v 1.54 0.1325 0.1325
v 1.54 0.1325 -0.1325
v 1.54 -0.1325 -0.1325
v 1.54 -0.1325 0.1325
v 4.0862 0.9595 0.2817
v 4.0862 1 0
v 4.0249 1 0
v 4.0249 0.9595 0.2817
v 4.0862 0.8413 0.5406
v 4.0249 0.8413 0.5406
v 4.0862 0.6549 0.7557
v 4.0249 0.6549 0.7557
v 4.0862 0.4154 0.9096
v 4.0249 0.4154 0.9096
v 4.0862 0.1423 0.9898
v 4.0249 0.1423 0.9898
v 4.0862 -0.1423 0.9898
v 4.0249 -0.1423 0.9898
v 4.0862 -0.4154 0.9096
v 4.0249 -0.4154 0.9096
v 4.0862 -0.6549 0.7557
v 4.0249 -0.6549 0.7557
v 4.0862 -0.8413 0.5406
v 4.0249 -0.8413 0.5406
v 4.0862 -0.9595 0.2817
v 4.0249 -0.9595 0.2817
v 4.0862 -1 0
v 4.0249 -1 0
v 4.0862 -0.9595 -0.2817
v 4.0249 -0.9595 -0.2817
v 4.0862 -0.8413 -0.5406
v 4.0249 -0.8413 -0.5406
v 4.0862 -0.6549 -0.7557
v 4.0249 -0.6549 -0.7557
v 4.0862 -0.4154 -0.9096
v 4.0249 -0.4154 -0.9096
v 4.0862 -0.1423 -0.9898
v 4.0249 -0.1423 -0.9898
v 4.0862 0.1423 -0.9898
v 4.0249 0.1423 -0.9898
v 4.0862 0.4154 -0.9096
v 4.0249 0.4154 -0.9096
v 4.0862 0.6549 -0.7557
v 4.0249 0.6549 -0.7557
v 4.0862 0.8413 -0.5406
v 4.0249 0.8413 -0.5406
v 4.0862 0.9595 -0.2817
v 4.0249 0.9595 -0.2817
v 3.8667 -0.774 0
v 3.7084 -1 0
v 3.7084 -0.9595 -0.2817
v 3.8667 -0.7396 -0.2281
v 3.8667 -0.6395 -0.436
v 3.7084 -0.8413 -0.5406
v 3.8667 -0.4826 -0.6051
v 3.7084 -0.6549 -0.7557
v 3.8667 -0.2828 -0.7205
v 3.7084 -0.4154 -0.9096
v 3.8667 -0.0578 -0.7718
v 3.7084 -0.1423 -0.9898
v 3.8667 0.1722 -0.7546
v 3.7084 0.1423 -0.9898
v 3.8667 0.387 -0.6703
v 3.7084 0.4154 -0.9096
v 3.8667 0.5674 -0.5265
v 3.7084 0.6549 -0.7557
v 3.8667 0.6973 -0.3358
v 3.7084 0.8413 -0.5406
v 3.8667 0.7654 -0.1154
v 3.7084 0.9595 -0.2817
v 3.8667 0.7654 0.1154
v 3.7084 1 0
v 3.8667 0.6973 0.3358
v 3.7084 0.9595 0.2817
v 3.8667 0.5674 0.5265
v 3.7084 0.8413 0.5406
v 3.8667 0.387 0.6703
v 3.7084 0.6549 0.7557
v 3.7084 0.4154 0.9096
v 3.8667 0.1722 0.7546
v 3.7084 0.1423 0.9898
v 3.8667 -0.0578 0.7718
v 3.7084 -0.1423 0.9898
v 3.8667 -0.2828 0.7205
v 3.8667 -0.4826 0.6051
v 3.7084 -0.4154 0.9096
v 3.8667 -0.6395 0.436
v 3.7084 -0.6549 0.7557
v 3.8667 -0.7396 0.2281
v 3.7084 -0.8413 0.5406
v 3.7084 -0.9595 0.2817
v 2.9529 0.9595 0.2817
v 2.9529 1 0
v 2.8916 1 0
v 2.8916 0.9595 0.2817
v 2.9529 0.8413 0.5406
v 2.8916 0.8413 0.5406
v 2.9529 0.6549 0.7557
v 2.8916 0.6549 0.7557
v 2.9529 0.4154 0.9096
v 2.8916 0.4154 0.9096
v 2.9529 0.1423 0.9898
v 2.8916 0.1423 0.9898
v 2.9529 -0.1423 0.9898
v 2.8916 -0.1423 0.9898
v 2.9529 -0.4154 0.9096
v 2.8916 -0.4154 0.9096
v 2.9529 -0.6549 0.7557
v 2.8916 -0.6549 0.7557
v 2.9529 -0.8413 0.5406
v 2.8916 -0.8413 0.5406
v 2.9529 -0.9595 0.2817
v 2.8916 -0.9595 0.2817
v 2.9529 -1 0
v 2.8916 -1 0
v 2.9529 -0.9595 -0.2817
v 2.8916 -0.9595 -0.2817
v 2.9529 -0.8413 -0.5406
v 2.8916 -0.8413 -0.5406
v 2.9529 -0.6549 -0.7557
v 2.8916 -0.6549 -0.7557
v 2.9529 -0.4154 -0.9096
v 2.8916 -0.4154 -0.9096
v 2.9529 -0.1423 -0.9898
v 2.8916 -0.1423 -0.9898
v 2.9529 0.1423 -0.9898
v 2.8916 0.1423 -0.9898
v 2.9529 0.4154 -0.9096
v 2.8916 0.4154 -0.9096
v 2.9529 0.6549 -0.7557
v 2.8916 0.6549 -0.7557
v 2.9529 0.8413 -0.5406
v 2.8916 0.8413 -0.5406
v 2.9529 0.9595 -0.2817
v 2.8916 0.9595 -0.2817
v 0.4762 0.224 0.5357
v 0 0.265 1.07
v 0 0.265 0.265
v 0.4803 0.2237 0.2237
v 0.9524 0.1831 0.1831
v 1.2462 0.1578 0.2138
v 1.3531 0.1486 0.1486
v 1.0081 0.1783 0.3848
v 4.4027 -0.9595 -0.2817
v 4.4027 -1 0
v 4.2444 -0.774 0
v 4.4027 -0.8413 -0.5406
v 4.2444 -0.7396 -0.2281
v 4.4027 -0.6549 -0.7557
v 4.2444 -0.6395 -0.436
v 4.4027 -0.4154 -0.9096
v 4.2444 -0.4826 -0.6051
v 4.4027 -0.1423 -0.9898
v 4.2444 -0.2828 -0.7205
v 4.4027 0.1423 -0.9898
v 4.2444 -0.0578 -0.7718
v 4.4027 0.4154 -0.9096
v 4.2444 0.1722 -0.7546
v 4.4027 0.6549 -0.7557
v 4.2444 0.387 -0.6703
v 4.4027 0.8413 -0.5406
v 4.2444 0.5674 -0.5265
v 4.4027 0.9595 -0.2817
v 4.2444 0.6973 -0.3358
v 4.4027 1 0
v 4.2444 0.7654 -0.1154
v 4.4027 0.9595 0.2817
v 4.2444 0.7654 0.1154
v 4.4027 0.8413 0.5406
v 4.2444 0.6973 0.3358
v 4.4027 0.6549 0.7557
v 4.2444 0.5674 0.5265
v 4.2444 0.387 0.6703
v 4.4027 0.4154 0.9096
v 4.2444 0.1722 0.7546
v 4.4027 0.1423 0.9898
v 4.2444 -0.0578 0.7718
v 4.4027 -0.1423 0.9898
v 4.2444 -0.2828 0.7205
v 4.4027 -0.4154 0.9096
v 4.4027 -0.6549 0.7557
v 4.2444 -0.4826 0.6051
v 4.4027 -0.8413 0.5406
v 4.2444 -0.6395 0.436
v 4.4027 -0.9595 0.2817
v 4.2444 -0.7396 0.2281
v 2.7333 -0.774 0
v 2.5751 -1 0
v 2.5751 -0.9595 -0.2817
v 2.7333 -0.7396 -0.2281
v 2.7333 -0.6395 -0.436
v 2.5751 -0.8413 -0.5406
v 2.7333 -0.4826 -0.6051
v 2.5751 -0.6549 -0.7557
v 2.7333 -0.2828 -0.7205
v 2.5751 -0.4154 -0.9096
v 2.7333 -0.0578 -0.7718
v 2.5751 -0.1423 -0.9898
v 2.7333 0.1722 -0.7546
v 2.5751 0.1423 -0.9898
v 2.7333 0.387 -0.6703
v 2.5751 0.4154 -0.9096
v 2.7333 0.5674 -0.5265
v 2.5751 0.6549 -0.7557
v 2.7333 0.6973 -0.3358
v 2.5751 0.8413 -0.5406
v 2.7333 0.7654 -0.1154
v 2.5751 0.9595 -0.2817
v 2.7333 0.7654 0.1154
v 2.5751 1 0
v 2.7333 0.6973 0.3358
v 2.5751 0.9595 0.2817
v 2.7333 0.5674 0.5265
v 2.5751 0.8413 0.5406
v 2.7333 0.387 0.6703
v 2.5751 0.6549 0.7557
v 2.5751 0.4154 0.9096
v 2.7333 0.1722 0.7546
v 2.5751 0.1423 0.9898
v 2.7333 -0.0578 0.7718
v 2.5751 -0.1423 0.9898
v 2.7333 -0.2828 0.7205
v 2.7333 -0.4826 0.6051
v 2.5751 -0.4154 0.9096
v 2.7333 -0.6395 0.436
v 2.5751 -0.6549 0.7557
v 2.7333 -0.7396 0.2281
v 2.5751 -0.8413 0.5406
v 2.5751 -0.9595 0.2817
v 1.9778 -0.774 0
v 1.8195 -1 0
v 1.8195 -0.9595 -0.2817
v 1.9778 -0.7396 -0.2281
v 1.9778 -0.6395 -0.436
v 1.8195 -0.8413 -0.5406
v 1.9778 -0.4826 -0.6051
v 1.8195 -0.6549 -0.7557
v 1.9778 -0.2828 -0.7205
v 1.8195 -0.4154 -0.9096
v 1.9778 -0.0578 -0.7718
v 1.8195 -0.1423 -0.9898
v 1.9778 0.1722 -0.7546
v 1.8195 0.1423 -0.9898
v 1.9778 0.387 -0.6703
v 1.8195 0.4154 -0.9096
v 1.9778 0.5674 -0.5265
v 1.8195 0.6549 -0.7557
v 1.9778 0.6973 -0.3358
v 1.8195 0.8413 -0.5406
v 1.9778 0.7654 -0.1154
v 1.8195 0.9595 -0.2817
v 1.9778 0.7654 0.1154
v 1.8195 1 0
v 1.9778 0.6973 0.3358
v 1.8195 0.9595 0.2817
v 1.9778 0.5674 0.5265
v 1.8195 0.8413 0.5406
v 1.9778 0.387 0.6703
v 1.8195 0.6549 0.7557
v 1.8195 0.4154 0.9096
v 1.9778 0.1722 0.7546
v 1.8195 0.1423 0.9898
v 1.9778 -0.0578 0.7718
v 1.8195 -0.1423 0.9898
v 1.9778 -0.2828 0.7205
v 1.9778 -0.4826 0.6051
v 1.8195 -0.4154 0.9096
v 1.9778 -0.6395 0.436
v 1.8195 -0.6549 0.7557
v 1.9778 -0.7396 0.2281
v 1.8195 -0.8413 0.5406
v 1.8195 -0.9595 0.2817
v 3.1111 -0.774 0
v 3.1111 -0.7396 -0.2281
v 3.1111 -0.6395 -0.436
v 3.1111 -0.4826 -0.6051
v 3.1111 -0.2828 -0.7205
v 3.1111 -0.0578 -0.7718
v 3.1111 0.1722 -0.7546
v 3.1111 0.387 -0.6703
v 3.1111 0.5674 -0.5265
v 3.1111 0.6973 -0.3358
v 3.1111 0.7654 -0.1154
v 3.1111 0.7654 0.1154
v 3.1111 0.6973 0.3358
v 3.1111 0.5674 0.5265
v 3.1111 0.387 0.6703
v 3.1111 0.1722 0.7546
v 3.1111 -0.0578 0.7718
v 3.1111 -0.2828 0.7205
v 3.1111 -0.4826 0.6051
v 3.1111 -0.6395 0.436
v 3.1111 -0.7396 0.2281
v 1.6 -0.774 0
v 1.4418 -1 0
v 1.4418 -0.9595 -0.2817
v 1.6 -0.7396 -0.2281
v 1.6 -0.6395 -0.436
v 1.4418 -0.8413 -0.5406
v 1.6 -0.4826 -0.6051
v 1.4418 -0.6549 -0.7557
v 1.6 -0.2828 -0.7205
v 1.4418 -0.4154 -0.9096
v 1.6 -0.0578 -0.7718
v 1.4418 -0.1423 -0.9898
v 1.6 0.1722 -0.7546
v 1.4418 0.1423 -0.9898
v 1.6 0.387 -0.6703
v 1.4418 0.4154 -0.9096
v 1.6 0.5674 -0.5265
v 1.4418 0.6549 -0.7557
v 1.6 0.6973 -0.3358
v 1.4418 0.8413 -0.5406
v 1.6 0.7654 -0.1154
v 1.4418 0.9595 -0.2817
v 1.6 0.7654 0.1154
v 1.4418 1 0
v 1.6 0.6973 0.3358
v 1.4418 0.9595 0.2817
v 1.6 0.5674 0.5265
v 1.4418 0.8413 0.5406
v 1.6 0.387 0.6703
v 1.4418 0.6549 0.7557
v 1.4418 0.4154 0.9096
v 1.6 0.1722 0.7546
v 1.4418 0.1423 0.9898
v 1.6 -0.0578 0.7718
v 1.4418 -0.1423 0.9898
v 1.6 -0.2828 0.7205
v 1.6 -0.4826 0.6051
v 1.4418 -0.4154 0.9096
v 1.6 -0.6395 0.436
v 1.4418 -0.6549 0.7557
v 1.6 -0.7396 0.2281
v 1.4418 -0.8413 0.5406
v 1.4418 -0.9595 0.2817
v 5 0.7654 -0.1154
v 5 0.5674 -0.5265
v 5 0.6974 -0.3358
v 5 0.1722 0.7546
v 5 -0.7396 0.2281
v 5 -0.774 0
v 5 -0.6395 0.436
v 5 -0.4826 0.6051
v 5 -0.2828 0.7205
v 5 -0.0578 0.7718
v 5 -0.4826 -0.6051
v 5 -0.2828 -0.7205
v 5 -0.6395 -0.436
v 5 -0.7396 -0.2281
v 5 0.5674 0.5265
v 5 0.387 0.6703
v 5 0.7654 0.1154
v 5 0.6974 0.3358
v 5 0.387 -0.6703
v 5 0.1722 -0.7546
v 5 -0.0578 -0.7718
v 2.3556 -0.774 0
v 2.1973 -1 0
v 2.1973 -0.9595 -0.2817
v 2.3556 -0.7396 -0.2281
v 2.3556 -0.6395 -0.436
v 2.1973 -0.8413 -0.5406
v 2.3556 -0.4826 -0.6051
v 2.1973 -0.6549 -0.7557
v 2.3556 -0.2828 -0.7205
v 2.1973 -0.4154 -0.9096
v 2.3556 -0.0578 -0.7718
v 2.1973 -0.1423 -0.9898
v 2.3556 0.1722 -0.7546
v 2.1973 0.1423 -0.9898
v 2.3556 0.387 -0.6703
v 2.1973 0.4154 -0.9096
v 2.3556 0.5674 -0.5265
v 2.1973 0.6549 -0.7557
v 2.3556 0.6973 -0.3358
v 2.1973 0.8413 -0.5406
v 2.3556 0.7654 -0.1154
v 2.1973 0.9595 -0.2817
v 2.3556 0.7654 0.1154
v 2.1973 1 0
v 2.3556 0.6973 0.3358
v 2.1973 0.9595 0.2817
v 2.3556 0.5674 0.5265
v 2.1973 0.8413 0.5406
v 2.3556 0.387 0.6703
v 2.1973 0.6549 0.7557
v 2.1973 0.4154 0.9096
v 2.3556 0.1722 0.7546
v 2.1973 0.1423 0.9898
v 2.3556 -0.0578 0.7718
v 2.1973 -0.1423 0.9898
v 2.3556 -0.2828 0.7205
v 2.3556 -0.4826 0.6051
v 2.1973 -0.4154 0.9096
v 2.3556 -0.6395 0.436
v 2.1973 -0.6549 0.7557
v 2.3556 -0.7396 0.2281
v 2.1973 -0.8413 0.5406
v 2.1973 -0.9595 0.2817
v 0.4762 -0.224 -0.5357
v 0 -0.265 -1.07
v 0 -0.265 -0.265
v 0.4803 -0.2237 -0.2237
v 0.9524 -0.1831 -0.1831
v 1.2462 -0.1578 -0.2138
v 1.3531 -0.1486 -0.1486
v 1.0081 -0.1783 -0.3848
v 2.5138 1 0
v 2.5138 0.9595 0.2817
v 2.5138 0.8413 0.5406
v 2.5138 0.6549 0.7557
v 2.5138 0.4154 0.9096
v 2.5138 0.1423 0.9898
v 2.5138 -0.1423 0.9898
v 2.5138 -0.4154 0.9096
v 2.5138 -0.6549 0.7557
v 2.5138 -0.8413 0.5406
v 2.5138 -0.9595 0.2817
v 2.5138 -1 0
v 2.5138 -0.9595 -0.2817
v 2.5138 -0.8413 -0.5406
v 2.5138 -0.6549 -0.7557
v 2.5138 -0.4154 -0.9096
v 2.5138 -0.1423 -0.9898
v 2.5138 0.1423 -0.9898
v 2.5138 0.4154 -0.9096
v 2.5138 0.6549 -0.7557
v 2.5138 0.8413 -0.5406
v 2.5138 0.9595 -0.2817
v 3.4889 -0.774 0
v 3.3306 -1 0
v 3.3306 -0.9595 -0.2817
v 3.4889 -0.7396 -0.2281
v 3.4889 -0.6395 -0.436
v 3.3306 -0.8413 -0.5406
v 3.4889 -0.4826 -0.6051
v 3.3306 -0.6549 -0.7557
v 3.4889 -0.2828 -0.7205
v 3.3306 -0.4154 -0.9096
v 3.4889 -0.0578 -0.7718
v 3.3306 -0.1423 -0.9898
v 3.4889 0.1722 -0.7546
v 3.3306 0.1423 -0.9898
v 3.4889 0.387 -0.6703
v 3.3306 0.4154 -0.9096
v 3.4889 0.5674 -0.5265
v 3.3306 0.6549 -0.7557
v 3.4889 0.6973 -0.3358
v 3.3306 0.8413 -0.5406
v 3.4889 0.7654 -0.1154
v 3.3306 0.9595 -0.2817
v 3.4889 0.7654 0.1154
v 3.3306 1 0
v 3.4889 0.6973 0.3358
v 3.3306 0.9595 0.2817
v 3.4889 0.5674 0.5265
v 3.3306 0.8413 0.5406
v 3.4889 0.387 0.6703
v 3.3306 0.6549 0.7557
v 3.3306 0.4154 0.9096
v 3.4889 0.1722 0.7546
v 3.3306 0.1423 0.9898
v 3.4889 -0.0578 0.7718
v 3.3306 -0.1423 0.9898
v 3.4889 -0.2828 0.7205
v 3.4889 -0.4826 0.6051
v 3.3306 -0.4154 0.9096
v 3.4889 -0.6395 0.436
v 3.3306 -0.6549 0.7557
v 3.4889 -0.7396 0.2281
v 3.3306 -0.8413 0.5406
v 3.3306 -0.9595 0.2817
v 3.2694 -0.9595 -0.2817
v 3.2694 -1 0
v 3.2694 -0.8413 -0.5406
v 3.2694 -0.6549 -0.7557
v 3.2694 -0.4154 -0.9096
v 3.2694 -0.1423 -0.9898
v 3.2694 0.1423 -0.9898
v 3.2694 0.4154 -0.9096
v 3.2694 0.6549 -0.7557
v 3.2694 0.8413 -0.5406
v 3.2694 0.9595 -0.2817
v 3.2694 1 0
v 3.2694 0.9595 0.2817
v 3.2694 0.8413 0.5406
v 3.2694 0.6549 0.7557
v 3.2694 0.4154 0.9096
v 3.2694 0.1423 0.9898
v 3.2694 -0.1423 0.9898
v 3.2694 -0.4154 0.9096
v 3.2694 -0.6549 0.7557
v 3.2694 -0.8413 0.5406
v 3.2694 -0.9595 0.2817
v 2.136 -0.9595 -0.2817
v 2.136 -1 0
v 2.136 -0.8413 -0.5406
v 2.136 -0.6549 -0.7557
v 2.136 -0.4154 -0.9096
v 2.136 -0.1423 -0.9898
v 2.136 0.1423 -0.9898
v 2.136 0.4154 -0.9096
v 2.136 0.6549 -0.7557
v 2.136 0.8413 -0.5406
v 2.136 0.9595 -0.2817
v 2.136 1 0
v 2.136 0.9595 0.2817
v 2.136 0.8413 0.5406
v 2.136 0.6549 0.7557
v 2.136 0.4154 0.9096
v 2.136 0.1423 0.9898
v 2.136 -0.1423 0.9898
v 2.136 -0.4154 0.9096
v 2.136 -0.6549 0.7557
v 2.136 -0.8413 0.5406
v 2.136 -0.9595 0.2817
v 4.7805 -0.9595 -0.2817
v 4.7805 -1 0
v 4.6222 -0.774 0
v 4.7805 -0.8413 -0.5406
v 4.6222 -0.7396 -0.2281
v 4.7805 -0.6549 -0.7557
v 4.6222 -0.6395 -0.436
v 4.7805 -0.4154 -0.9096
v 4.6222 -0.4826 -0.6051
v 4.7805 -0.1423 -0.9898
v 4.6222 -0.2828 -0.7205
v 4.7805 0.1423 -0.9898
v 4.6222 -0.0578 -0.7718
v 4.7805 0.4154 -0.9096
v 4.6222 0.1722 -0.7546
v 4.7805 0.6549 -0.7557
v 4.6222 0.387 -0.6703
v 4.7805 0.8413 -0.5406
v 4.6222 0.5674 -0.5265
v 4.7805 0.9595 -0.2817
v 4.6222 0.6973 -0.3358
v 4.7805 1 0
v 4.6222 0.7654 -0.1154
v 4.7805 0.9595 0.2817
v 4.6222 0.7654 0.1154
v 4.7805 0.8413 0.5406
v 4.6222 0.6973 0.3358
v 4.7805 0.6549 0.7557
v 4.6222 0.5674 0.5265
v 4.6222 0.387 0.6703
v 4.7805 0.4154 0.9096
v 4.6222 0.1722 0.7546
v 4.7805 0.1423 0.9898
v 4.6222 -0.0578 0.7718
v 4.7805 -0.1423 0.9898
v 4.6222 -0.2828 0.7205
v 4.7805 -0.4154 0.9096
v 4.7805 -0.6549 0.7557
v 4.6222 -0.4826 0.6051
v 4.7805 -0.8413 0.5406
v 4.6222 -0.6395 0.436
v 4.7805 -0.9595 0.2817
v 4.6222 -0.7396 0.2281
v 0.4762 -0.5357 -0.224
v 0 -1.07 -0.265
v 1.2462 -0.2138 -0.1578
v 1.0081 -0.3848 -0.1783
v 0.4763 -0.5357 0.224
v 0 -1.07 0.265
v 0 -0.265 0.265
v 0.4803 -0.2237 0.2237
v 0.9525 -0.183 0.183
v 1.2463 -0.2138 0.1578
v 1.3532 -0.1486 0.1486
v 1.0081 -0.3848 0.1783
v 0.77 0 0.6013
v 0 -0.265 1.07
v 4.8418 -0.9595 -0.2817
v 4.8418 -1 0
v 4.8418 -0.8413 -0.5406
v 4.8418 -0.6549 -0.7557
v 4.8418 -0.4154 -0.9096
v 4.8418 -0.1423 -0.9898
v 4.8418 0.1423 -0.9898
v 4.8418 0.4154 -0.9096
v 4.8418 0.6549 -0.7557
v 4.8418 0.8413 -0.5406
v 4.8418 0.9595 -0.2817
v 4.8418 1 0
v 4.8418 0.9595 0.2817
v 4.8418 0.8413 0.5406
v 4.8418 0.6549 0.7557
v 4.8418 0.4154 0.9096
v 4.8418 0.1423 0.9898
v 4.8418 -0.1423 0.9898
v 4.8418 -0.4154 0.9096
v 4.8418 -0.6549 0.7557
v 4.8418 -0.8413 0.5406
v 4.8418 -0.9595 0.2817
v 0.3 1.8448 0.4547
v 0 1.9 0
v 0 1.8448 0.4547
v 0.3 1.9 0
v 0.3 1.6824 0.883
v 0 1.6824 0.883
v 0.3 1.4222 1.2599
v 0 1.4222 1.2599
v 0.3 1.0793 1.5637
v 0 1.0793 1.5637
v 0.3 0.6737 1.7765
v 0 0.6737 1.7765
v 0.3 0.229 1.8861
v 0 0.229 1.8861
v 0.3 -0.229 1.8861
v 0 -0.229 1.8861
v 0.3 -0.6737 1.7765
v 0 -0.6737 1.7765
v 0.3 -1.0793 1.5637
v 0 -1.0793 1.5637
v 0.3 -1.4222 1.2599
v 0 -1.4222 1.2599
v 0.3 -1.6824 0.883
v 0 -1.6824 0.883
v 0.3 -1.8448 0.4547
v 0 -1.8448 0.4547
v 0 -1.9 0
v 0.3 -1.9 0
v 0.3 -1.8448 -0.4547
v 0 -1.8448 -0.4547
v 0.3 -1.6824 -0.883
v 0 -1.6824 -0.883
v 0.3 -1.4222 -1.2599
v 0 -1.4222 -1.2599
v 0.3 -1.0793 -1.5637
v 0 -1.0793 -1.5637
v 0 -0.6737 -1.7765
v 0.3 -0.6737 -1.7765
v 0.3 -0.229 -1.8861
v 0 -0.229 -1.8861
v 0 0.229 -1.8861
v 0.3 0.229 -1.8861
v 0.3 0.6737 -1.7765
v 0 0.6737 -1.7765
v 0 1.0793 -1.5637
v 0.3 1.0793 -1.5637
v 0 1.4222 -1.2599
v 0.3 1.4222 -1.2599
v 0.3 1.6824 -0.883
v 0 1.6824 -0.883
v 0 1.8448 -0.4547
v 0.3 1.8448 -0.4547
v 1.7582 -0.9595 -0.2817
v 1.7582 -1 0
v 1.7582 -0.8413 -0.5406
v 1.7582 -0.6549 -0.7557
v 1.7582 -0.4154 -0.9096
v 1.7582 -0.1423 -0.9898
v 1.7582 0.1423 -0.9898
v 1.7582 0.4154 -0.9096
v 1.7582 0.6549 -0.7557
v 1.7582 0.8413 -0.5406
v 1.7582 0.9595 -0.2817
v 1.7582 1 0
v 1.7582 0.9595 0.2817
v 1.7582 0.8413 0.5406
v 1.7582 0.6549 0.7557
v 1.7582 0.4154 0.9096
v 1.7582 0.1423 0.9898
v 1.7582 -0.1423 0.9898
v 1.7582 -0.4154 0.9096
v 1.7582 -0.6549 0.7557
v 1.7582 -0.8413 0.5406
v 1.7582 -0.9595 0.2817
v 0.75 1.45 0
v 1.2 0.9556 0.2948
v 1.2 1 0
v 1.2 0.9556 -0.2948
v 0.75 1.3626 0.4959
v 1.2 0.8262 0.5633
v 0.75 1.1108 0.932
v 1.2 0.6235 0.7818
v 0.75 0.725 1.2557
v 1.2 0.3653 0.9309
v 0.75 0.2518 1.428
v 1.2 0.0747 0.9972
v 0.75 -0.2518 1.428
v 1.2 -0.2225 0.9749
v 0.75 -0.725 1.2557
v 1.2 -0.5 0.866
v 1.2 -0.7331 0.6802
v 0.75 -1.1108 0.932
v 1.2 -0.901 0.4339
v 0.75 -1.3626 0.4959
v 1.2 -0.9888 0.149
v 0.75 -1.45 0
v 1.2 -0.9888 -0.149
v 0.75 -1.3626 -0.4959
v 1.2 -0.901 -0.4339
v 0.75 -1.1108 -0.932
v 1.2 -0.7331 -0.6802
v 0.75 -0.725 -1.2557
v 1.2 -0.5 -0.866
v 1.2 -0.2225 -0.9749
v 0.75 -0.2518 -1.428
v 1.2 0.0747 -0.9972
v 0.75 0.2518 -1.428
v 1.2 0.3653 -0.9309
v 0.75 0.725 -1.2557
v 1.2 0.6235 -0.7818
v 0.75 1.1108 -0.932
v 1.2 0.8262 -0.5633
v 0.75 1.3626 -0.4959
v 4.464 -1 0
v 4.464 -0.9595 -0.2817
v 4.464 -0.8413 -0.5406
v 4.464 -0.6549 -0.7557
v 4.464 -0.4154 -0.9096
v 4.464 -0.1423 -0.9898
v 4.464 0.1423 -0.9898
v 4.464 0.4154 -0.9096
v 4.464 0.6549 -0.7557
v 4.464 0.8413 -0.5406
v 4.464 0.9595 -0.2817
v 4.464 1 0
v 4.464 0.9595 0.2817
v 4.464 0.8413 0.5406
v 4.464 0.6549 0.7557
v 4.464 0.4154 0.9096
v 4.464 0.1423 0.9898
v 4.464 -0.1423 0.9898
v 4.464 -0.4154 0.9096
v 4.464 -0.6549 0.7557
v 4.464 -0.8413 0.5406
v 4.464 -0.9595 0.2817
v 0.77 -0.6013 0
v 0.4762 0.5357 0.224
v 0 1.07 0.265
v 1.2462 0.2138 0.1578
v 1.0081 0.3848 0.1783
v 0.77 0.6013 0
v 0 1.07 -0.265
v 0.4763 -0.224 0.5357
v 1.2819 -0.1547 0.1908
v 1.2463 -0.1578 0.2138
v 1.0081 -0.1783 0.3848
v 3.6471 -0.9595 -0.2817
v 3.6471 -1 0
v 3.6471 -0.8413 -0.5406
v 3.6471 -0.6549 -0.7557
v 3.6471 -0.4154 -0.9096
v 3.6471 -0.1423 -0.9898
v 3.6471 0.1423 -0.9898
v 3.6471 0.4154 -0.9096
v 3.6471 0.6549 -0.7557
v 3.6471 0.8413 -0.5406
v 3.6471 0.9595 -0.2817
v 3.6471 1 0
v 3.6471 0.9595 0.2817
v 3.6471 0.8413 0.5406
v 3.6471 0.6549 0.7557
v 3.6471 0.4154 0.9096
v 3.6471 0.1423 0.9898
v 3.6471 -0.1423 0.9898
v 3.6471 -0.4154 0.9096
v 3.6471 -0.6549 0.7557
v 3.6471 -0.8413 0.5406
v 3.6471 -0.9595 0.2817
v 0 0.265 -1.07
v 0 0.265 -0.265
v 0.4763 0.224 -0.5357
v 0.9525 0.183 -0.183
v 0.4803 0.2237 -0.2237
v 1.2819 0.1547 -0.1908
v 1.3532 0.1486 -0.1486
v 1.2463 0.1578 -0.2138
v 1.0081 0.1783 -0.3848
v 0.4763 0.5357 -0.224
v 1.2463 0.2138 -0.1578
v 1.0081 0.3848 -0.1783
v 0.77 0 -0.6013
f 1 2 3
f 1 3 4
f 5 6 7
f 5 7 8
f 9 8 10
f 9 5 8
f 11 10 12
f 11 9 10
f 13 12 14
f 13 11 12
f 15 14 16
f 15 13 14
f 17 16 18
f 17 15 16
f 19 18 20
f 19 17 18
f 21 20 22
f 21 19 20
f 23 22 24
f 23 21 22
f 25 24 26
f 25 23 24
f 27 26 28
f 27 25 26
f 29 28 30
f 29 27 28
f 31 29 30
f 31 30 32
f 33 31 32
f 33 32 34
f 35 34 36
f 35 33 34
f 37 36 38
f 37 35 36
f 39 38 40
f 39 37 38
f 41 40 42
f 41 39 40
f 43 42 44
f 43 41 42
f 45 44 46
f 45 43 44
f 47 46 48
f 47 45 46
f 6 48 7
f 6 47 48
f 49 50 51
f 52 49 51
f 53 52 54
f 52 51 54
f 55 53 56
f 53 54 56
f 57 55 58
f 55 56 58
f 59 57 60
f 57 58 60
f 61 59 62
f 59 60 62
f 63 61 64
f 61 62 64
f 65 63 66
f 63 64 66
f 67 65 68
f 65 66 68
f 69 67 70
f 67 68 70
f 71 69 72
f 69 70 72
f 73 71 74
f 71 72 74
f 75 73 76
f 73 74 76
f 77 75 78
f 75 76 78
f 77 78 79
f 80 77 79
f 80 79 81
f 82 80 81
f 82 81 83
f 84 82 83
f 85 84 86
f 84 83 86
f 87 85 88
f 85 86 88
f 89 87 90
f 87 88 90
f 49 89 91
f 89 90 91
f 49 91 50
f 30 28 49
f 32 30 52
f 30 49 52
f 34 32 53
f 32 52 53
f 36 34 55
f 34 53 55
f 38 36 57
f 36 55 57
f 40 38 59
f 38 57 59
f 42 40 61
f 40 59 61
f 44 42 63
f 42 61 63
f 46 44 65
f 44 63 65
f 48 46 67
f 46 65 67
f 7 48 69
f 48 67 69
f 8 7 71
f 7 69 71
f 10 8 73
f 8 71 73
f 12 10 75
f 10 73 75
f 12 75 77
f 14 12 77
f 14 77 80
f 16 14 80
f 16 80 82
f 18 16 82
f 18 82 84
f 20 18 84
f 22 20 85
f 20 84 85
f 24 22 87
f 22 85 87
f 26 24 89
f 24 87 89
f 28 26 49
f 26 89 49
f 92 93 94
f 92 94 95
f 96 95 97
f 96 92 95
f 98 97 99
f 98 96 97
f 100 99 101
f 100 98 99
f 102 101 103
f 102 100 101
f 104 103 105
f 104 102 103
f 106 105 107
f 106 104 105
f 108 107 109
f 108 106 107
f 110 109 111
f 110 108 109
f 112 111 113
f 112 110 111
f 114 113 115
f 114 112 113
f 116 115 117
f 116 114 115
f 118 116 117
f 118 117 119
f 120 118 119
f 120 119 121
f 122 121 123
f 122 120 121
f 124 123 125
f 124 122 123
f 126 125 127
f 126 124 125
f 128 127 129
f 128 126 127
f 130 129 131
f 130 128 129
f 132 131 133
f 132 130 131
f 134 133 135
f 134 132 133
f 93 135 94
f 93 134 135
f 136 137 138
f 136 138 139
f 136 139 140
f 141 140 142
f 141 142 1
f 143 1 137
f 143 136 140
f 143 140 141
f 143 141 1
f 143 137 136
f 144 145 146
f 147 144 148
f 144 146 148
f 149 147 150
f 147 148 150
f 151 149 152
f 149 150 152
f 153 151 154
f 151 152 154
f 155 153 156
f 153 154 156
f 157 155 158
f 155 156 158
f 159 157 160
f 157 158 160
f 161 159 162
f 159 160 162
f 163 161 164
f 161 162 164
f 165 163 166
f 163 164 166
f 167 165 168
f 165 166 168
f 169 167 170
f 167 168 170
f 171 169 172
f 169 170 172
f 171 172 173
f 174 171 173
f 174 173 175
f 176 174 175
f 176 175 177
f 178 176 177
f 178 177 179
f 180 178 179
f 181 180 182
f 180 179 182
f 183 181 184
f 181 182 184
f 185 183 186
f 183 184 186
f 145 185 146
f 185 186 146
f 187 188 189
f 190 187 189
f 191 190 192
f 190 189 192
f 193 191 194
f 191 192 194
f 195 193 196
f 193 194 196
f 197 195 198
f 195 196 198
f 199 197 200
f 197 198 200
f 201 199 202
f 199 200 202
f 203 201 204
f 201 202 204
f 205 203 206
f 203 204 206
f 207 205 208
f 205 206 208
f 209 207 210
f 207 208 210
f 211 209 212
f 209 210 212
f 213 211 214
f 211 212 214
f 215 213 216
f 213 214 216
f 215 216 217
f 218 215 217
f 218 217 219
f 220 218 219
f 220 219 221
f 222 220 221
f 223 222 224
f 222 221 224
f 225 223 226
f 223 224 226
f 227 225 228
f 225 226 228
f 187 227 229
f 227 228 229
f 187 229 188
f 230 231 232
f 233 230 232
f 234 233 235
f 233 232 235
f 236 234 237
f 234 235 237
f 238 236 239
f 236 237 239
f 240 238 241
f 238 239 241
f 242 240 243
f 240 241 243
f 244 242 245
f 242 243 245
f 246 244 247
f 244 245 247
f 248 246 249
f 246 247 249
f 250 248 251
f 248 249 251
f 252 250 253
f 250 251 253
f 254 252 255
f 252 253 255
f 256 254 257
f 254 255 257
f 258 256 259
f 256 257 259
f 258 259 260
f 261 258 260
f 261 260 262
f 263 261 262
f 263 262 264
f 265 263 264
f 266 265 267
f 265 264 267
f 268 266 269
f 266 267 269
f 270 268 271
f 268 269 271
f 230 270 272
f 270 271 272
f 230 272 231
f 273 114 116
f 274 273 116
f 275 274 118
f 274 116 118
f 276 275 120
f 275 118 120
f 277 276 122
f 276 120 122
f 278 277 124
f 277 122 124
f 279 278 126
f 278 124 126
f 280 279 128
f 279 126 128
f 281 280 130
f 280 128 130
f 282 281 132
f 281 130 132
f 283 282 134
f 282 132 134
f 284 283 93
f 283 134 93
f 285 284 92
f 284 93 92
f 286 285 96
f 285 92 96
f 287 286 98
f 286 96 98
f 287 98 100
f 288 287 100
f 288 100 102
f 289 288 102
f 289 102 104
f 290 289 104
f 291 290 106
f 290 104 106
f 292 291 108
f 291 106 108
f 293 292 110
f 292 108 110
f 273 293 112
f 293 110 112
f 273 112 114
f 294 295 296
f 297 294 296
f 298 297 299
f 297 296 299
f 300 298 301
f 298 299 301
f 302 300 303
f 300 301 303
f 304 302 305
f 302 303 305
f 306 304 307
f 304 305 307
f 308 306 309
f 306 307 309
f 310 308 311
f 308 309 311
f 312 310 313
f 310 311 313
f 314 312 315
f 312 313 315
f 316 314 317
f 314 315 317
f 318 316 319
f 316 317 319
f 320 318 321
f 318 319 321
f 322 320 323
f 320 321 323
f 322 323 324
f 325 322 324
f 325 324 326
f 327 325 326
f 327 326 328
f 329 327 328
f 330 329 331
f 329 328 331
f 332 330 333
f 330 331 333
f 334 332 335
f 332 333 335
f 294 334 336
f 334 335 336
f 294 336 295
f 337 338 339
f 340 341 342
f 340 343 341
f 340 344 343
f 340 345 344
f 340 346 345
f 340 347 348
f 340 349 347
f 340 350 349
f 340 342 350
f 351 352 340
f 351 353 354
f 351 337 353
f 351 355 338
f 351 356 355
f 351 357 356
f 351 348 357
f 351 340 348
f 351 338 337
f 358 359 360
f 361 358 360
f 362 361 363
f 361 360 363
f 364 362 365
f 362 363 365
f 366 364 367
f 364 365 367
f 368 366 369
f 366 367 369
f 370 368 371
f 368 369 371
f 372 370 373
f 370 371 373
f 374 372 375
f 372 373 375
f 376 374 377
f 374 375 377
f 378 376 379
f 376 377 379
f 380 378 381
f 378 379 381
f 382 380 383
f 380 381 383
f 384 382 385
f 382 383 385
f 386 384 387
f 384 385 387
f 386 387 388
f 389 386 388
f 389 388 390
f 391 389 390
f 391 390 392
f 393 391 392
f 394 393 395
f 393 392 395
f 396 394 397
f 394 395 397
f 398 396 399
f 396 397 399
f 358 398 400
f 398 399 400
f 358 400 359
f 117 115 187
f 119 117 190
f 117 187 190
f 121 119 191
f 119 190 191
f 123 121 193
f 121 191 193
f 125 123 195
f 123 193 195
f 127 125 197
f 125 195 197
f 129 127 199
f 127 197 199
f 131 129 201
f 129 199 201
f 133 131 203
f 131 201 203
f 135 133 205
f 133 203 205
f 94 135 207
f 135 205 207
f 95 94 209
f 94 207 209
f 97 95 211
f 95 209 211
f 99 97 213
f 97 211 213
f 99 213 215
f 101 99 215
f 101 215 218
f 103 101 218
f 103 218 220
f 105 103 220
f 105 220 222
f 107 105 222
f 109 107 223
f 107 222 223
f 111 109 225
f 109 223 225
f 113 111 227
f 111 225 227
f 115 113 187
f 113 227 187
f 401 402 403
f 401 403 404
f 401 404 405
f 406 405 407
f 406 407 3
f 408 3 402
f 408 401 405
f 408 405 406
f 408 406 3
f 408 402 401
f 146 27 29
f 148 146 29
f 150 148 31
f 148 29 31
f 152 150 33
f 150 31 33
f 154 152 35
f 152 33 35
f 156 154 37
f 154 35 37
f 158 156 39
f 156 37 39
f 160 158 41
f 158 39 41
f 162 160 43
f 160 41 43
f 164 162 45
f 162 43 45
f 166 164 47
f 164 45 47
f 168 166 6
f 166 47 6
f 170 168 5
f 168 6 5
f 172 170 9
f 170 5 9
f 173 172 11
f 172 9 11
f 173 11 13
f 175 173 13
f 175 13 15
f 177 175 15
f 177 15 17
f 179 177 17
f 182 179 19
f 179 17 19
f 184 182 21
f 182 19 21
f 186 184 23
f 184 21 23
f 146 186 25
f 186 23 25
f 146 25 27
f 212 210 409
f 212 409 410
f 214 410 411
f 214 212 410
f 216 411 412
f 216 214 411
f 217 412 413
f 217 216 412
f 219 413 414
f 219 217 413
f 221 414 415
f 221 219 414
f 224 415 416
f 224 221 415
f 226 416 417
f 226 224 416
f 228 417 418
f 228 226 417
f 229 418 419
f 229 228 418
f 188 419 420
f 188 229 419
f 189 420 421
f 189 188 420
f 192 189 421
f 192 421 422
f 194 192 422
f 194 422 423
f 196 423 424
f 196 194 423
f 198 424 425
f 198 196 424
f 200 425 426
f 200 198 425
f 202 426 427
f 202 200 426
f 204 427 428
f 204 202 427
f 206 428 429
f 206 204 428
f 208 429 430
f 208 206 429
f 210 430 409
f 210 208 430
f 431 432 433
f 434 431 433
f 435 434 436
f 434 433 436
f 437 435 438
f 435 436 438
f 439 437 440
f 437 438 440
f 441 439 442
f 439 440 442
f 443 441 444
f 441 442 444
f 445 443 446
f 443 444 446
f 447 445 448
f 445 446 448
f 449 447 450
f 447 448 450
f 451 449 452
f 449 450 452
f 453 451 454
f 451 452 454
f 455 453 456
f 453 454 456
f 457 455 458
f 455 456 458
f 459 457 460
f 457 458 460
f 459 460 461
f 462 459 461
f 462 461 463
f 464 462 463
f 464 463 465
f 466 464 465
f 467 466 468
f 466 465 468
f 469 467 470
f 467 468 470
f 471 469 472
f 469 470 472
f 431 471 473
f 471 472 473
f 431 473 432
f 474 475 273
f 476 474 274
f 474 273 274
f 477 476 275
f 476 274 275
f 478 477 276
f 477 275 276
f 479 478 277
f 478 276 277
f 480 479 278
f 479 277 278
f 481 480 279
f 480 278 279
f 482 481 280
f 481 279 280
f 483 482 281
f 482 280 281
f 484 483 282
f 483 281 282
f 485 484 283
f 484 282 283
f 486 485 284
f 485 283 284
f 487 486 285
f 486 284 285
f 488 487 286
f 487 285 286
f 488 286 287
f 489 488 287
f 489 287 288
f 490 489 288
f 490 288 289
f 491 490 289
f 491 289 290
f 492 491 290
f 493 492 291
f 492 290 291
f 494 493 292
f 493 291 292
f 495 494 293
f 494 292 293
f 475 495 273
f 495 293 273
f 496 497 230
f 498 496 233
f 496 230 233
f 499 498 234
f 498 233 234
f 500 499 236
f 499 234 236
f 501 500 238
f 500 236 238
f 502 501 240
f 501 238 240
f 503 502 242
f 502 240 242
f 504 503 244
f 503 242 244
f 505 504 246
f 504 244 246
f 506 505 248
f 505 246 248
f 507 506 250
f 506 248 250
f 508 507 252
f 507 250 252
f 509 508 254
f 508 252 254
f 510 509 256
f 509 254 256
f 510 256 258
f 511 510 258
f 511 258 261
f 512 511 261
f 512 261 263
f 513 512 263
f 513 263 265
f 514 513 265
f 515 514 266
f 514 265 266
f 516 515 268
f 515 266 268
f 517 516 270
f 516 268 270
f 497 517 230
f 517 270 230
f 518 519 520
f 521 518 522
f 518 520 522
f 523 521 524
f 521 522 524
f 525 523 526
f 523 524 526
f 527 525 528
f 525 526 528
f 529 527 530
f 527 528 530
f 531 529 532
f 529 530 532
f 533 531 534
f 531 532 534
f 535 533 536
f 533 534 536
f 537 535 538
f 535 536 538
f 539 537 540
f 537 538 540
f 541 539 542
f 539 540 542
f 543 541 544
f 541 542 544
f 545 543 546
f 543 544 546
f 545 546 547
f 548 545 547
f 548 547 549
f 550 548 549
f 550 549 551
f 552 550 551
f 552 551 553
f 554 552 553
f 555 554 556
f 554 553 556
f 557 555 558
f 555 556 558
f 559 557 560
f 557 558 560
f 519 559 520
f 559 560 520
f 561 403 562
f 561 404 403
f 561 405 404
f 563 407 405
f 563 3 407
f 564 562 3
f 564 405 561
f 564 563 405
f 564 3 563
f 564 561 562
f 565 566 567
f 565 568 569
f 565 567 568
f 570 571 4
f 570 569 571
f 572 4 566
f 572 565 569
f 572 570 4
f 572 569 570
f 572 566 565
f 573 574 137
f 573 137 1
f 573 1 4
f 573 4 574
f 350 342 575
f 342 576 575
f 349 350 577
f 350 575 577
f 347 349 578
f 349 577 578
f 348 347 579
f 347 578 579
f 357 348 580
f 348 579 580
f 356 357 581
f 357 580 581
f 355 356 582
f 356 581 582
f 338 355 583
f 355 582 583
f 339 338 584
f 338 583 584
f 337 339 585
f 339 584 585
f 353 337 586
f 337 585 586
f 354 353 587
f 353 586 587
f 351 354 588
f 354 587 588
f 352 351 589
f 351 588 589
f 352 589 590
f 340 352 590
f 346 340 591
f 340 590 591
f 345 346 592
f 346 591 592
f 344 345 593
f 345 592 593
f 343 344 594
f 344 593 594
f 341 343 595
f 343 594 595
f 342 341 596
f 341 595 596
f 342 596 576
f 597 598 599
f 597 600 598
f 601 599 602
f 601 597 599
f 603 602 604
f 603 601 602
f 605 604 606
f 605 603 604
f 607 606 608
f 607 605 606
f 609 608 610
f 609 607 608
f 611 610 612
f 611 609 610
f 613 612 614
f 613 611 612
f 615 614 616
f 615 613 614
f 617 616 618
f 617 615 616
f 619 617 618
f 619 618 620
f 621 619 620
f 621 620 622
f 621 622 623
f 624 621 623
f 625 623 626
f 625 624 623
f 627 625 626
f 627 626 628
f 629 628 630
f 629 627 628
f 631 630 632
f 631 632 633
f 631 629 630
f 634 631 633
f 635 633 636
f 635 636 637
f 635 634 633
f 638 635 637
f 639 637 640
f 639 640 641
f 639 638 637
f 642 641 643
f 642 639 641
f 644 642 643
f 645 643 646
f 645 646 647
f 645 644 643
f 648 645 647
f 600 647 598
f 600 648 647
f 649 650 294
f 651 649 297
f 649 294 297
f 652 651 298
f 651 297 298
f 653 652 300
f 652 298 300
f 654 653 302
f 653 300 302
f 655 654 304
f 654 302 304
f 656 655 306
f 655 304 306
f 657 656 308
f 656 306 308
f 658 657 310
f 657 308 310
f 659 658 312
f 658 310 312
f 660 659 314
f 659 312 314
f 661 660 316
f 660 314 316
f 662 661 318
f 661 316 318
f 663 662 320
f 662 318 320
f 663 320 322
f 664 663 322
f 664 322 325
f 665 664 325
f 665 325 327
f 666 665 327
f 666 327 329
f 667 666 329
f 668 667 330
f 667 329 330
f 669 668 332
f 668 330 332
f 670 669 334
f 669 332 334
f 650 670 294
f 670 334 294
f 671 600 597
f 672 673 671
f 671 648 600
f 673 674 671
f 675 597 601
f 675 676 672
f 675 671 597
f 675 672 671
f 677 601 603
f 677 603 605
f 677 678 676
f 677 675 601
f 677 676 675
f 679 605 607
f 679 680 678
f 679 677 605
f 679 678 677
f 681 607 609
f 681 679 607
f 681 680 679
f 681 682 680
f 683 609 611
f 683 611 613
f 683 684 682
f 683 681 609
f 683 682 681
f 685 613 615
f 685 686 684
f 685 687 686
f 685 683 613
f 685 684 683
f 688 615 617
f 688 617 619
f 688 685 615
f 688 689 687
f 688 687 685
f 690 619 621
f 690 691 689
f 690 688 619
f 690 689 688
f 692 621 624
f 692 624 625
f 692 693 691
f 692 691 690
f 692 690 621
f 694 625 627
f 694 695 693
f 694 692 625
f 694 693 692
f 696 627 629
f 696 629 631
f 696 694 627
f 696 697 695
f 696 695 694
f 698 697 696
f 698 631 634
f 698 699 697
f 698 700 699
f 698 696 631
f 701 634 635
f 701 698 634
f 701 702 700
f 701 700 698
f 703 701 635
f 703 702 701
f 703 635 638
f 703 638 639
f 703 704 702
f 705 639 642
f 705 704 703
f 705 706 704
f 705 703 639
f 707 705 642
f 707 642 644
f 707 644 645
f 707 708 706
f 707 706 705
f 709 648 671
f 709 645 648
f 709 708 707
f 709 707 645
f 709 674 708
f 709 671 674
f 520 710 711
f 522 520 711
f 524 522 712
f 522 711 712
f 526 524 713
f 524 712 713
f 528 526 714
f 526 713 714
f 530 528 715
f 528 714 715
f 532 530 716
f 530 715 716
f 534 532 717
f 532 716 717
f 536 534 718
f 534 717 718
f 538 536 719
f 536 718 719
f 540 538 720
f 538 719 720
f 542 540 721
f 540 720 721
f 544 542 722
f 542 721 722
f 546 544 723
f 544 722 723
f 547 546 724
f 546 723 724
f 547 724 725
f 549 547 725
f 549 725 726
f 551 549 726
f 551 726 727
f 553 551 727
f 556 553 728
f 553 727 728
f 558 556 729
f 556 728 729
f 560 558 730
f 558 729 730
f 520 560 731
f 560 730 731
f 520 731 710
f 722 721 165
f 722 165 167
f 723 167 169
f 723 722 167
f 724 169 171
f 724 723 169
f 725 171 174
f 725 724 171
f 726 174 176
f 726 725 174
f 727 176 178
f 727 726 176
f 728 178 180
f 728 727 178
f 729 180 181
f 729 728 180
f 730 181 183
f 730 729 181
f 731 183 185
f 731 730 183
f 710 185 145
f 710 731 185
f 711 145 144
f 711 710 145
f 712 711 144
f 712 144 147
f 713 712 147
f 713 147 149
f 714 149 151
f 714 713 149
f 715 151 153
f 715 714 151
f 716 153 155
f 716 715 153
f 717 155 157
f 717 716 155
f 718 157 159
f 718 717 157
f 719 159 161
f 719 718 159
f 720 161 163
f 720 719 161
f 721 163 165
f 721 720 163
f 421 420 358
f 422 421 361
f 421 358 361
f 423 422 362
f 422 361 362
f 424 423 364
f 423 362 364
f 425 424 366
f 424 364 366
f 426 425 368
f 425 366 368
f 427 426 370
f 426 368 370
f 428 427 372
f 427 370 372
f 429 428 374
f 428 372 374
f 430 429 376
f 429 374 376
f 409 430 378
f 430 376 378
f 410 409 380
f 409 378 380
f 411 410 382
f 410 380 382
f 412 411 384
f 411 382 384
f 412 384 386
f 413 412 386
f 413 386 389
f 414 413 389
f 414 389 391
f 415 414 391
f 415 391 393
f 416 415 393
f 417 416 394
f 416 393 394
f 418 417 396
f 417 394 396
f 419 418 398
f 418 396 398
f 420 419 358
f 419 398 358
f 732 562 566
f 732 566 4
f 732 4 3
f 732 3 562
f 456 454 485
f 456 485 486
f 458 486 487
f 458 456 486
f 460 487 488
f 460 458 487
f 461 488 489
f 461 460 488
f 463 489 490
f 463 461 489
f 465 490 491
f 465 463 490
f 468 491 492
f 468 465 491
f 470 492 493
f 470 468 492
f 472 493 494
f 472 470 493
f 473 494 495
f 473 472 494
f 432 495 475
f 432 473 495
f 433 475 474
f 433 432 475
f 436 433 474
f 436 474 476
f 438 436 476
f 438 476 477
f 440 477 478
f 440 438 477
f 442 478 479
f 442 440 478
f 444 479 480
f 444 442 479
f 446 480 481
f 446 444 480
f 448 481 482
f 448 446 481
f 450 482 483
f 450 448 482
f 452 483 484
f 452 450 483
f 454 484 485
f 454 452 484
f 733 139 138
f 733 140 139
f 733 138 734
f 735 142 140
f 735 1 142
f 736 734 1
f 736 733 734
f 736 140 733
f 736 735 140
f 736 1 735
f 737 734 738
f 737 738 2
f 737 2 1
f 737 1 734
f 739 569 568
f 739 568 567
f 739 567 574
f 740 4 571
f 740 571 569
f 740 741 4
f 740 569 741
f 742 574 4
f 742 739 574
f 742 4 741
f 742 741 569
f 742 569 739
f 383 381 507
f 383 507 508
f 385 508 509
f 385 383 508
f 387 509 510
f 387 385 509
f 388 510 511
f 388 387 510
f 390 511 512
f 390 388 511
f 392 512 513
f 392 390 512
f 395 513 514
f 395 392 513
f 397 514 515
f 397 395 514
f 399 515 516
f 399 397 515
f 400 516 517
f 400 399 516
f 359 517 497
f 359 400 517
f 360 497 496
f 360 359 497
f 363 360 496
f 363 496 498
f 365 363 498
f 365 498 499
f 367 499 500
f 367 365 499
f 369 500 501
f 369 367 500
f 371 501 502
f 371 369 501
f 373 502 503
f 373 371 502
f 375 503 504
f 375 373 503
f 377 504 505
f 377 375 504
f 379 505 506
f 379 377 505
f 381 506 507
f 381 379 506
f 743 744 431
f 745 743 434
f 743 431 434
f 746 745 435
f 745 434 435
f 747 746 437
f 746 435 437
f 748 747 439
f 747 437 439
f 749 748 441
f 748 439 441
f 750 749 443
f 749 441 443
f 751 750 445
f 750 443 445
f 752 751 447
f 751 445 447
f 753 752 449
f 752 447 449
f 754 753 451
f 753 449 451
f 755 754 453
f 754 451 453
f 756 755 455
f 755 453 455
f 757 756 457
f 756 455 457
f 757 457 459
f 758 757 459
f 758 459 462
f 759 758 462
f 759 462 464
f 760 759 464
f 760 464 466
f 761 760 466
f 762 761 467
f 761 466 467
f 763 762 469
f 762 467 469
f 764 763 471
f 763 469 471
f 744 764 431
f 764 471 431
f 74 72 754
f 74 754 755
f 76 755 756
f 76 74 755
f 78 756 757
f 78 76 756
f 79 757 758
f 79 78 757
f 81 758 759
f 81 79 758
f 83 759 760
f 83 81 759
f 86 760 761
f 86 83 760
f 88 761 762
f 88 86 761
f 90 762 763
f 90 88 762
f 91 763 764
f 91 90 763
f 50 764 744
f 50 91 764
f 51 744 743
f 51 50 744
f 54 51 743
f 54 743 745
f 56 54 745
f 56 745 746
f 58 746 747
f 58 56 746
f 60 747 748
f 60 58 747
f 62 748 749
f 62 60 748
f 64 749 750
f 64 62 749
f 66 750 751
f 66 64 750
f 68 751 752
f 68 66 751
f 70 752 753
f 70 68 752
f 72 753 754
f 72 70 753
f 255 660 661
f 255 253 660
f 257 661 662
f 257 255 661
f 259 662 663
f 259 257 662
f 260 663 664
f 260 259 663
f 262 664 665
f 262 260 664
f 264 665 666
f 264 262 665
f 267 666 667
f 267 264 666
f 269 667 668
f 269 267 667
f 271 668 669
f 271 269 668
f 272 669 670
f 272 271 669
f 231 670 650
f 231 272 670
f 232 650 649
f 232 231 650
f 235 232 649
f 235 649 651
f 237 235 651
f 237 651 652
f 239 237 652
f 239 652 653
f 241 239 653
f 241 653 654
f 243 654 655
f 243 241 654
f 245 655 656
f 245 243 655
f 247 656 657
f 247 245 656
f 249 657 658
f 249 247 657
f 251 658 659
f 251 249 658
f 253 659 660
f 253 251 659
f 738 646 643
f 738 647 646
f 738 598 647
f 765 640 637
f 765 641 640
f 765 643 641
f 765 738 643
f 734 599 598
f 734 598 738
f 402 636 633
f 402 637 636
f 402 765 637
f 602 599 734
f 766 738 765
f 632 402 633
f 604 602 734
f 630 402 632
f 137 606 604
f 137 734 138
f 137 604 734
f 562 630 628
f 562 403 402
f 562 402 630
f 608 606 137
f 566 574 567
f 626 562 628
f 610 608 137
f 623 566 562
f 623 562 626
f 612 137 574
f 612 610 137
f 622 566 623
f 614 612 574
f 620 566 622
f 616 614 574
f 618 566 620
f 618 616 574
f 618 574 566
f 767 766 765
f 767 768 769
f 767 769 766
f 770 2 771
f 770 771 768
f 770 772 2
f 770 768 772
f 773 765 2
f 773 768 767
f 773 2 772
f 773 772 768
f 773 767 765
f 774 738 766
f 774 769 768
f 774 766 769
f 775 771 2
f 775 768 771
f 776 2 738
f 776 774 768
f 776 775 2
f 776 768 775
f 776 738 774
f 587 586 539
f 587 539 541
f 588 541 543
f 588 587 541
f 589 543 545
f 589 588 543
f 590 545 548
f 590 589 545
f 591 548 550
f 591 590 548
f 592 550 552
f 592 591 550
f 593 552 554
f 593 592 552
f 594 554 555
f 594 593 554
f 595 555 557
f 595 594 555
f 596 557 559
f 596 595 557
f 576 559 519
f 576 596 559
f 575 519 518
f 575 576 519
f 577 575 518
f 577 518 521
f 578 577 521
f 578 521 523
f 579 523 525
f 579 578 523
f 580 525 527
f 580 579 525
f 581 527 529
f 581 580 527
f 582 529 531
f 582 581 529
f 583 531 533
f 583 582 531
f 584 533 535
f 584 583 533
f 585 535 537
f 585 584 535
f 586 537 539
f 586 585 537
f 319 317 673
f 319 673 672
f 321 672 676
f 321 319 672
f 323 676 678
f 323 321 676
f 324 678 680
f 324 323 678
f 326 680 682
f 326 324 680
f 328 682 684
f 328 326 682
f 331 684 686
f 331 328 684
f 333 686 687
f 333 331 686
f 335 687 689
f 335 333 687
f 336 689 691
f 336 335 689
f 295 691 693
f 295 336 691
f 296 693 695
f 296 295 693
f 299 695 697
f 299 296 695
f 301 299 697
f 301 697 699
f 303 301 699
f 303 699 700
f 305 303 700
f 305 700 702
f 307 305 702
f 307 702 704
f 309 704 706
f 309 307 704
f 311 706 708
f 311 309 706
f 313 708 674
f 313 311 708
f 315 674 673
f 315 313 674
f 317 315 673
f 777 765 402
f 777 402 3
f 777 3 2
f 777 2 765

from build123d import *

# Parameters (mm, degrees)
SKETCH3_W         = 0.53
SKETCH3_H         = 2.14
SKETCH4_W         = 0.265
SKETCH4_H         = 0.265
CIRPATTERN1_COUNT = 2
CIRPATTERN1_ANGLE = 90
THDSCHPAT_COUNT   = 10
THDSCHPAT_PITCH   = 0.377777778


with BuildPart() as part:
    # BodySke → Base-Revolve (revolve)
    with BuildSketch(Plane.XY):
        Polygon((0, 0), (0, 1.9), (0.3, 1.9), (1.2, 1), (5, 1), (5, 0), align=None)
    revolve(axis=Axis((-6.35, 0, 0), (1, 0, 0)))

    # Sketch3 → Cross section 0
    with BuildSketch(Plane.ZY):
        Rectangle(SKETCH3_W, SKETCH3_H)
    # Sketch4 → Cross section 1
    with BuildSketch(Plane.ZY.offset(-1.54)):
        Rectangle(SKETCH4_W, SKETCH4_H)
    cross = loft(mode=Mode.SUBTRACT)

    # CirPattern1: Cross ×2 about axis
    cirpattern1_axis = Axis((0, 0, 0), (1, 0, 0))
    for i in range(1, CIRPATTERN1_COUNT):
        add(cross.rotate(cirpattern1_axis, i * CIRPATTERN1_ANGLE / (CIRPATTERN1_COUNT - 1)), mode=Mode.SUBTRACT)

    # ThdSchSke → ThreadSchematic (revolve, cut)
    with BuildSketch(Plane.XY):
        Polygon((1.600001, -0.774), (1.441754096, -1), (1.441754096, -1.25), (1.758247904, -1.25), (1.758247904, -1), align=None)
    threadschematic = revolve(axis=Axis((-3.175, 0, 0), (1, 0, 0)), mode=Mode.SUBTRACT)

    # ThdSchPat: ThreadSchematic ×10
    with Locations(*[(i * THDSCHPAT_PITCH, 0, 0) for i in range(1, THDSCHPAT_COUNT)]):
        add(threadschematic, mode=Mode.SUBTRACT)


solid = part.part
